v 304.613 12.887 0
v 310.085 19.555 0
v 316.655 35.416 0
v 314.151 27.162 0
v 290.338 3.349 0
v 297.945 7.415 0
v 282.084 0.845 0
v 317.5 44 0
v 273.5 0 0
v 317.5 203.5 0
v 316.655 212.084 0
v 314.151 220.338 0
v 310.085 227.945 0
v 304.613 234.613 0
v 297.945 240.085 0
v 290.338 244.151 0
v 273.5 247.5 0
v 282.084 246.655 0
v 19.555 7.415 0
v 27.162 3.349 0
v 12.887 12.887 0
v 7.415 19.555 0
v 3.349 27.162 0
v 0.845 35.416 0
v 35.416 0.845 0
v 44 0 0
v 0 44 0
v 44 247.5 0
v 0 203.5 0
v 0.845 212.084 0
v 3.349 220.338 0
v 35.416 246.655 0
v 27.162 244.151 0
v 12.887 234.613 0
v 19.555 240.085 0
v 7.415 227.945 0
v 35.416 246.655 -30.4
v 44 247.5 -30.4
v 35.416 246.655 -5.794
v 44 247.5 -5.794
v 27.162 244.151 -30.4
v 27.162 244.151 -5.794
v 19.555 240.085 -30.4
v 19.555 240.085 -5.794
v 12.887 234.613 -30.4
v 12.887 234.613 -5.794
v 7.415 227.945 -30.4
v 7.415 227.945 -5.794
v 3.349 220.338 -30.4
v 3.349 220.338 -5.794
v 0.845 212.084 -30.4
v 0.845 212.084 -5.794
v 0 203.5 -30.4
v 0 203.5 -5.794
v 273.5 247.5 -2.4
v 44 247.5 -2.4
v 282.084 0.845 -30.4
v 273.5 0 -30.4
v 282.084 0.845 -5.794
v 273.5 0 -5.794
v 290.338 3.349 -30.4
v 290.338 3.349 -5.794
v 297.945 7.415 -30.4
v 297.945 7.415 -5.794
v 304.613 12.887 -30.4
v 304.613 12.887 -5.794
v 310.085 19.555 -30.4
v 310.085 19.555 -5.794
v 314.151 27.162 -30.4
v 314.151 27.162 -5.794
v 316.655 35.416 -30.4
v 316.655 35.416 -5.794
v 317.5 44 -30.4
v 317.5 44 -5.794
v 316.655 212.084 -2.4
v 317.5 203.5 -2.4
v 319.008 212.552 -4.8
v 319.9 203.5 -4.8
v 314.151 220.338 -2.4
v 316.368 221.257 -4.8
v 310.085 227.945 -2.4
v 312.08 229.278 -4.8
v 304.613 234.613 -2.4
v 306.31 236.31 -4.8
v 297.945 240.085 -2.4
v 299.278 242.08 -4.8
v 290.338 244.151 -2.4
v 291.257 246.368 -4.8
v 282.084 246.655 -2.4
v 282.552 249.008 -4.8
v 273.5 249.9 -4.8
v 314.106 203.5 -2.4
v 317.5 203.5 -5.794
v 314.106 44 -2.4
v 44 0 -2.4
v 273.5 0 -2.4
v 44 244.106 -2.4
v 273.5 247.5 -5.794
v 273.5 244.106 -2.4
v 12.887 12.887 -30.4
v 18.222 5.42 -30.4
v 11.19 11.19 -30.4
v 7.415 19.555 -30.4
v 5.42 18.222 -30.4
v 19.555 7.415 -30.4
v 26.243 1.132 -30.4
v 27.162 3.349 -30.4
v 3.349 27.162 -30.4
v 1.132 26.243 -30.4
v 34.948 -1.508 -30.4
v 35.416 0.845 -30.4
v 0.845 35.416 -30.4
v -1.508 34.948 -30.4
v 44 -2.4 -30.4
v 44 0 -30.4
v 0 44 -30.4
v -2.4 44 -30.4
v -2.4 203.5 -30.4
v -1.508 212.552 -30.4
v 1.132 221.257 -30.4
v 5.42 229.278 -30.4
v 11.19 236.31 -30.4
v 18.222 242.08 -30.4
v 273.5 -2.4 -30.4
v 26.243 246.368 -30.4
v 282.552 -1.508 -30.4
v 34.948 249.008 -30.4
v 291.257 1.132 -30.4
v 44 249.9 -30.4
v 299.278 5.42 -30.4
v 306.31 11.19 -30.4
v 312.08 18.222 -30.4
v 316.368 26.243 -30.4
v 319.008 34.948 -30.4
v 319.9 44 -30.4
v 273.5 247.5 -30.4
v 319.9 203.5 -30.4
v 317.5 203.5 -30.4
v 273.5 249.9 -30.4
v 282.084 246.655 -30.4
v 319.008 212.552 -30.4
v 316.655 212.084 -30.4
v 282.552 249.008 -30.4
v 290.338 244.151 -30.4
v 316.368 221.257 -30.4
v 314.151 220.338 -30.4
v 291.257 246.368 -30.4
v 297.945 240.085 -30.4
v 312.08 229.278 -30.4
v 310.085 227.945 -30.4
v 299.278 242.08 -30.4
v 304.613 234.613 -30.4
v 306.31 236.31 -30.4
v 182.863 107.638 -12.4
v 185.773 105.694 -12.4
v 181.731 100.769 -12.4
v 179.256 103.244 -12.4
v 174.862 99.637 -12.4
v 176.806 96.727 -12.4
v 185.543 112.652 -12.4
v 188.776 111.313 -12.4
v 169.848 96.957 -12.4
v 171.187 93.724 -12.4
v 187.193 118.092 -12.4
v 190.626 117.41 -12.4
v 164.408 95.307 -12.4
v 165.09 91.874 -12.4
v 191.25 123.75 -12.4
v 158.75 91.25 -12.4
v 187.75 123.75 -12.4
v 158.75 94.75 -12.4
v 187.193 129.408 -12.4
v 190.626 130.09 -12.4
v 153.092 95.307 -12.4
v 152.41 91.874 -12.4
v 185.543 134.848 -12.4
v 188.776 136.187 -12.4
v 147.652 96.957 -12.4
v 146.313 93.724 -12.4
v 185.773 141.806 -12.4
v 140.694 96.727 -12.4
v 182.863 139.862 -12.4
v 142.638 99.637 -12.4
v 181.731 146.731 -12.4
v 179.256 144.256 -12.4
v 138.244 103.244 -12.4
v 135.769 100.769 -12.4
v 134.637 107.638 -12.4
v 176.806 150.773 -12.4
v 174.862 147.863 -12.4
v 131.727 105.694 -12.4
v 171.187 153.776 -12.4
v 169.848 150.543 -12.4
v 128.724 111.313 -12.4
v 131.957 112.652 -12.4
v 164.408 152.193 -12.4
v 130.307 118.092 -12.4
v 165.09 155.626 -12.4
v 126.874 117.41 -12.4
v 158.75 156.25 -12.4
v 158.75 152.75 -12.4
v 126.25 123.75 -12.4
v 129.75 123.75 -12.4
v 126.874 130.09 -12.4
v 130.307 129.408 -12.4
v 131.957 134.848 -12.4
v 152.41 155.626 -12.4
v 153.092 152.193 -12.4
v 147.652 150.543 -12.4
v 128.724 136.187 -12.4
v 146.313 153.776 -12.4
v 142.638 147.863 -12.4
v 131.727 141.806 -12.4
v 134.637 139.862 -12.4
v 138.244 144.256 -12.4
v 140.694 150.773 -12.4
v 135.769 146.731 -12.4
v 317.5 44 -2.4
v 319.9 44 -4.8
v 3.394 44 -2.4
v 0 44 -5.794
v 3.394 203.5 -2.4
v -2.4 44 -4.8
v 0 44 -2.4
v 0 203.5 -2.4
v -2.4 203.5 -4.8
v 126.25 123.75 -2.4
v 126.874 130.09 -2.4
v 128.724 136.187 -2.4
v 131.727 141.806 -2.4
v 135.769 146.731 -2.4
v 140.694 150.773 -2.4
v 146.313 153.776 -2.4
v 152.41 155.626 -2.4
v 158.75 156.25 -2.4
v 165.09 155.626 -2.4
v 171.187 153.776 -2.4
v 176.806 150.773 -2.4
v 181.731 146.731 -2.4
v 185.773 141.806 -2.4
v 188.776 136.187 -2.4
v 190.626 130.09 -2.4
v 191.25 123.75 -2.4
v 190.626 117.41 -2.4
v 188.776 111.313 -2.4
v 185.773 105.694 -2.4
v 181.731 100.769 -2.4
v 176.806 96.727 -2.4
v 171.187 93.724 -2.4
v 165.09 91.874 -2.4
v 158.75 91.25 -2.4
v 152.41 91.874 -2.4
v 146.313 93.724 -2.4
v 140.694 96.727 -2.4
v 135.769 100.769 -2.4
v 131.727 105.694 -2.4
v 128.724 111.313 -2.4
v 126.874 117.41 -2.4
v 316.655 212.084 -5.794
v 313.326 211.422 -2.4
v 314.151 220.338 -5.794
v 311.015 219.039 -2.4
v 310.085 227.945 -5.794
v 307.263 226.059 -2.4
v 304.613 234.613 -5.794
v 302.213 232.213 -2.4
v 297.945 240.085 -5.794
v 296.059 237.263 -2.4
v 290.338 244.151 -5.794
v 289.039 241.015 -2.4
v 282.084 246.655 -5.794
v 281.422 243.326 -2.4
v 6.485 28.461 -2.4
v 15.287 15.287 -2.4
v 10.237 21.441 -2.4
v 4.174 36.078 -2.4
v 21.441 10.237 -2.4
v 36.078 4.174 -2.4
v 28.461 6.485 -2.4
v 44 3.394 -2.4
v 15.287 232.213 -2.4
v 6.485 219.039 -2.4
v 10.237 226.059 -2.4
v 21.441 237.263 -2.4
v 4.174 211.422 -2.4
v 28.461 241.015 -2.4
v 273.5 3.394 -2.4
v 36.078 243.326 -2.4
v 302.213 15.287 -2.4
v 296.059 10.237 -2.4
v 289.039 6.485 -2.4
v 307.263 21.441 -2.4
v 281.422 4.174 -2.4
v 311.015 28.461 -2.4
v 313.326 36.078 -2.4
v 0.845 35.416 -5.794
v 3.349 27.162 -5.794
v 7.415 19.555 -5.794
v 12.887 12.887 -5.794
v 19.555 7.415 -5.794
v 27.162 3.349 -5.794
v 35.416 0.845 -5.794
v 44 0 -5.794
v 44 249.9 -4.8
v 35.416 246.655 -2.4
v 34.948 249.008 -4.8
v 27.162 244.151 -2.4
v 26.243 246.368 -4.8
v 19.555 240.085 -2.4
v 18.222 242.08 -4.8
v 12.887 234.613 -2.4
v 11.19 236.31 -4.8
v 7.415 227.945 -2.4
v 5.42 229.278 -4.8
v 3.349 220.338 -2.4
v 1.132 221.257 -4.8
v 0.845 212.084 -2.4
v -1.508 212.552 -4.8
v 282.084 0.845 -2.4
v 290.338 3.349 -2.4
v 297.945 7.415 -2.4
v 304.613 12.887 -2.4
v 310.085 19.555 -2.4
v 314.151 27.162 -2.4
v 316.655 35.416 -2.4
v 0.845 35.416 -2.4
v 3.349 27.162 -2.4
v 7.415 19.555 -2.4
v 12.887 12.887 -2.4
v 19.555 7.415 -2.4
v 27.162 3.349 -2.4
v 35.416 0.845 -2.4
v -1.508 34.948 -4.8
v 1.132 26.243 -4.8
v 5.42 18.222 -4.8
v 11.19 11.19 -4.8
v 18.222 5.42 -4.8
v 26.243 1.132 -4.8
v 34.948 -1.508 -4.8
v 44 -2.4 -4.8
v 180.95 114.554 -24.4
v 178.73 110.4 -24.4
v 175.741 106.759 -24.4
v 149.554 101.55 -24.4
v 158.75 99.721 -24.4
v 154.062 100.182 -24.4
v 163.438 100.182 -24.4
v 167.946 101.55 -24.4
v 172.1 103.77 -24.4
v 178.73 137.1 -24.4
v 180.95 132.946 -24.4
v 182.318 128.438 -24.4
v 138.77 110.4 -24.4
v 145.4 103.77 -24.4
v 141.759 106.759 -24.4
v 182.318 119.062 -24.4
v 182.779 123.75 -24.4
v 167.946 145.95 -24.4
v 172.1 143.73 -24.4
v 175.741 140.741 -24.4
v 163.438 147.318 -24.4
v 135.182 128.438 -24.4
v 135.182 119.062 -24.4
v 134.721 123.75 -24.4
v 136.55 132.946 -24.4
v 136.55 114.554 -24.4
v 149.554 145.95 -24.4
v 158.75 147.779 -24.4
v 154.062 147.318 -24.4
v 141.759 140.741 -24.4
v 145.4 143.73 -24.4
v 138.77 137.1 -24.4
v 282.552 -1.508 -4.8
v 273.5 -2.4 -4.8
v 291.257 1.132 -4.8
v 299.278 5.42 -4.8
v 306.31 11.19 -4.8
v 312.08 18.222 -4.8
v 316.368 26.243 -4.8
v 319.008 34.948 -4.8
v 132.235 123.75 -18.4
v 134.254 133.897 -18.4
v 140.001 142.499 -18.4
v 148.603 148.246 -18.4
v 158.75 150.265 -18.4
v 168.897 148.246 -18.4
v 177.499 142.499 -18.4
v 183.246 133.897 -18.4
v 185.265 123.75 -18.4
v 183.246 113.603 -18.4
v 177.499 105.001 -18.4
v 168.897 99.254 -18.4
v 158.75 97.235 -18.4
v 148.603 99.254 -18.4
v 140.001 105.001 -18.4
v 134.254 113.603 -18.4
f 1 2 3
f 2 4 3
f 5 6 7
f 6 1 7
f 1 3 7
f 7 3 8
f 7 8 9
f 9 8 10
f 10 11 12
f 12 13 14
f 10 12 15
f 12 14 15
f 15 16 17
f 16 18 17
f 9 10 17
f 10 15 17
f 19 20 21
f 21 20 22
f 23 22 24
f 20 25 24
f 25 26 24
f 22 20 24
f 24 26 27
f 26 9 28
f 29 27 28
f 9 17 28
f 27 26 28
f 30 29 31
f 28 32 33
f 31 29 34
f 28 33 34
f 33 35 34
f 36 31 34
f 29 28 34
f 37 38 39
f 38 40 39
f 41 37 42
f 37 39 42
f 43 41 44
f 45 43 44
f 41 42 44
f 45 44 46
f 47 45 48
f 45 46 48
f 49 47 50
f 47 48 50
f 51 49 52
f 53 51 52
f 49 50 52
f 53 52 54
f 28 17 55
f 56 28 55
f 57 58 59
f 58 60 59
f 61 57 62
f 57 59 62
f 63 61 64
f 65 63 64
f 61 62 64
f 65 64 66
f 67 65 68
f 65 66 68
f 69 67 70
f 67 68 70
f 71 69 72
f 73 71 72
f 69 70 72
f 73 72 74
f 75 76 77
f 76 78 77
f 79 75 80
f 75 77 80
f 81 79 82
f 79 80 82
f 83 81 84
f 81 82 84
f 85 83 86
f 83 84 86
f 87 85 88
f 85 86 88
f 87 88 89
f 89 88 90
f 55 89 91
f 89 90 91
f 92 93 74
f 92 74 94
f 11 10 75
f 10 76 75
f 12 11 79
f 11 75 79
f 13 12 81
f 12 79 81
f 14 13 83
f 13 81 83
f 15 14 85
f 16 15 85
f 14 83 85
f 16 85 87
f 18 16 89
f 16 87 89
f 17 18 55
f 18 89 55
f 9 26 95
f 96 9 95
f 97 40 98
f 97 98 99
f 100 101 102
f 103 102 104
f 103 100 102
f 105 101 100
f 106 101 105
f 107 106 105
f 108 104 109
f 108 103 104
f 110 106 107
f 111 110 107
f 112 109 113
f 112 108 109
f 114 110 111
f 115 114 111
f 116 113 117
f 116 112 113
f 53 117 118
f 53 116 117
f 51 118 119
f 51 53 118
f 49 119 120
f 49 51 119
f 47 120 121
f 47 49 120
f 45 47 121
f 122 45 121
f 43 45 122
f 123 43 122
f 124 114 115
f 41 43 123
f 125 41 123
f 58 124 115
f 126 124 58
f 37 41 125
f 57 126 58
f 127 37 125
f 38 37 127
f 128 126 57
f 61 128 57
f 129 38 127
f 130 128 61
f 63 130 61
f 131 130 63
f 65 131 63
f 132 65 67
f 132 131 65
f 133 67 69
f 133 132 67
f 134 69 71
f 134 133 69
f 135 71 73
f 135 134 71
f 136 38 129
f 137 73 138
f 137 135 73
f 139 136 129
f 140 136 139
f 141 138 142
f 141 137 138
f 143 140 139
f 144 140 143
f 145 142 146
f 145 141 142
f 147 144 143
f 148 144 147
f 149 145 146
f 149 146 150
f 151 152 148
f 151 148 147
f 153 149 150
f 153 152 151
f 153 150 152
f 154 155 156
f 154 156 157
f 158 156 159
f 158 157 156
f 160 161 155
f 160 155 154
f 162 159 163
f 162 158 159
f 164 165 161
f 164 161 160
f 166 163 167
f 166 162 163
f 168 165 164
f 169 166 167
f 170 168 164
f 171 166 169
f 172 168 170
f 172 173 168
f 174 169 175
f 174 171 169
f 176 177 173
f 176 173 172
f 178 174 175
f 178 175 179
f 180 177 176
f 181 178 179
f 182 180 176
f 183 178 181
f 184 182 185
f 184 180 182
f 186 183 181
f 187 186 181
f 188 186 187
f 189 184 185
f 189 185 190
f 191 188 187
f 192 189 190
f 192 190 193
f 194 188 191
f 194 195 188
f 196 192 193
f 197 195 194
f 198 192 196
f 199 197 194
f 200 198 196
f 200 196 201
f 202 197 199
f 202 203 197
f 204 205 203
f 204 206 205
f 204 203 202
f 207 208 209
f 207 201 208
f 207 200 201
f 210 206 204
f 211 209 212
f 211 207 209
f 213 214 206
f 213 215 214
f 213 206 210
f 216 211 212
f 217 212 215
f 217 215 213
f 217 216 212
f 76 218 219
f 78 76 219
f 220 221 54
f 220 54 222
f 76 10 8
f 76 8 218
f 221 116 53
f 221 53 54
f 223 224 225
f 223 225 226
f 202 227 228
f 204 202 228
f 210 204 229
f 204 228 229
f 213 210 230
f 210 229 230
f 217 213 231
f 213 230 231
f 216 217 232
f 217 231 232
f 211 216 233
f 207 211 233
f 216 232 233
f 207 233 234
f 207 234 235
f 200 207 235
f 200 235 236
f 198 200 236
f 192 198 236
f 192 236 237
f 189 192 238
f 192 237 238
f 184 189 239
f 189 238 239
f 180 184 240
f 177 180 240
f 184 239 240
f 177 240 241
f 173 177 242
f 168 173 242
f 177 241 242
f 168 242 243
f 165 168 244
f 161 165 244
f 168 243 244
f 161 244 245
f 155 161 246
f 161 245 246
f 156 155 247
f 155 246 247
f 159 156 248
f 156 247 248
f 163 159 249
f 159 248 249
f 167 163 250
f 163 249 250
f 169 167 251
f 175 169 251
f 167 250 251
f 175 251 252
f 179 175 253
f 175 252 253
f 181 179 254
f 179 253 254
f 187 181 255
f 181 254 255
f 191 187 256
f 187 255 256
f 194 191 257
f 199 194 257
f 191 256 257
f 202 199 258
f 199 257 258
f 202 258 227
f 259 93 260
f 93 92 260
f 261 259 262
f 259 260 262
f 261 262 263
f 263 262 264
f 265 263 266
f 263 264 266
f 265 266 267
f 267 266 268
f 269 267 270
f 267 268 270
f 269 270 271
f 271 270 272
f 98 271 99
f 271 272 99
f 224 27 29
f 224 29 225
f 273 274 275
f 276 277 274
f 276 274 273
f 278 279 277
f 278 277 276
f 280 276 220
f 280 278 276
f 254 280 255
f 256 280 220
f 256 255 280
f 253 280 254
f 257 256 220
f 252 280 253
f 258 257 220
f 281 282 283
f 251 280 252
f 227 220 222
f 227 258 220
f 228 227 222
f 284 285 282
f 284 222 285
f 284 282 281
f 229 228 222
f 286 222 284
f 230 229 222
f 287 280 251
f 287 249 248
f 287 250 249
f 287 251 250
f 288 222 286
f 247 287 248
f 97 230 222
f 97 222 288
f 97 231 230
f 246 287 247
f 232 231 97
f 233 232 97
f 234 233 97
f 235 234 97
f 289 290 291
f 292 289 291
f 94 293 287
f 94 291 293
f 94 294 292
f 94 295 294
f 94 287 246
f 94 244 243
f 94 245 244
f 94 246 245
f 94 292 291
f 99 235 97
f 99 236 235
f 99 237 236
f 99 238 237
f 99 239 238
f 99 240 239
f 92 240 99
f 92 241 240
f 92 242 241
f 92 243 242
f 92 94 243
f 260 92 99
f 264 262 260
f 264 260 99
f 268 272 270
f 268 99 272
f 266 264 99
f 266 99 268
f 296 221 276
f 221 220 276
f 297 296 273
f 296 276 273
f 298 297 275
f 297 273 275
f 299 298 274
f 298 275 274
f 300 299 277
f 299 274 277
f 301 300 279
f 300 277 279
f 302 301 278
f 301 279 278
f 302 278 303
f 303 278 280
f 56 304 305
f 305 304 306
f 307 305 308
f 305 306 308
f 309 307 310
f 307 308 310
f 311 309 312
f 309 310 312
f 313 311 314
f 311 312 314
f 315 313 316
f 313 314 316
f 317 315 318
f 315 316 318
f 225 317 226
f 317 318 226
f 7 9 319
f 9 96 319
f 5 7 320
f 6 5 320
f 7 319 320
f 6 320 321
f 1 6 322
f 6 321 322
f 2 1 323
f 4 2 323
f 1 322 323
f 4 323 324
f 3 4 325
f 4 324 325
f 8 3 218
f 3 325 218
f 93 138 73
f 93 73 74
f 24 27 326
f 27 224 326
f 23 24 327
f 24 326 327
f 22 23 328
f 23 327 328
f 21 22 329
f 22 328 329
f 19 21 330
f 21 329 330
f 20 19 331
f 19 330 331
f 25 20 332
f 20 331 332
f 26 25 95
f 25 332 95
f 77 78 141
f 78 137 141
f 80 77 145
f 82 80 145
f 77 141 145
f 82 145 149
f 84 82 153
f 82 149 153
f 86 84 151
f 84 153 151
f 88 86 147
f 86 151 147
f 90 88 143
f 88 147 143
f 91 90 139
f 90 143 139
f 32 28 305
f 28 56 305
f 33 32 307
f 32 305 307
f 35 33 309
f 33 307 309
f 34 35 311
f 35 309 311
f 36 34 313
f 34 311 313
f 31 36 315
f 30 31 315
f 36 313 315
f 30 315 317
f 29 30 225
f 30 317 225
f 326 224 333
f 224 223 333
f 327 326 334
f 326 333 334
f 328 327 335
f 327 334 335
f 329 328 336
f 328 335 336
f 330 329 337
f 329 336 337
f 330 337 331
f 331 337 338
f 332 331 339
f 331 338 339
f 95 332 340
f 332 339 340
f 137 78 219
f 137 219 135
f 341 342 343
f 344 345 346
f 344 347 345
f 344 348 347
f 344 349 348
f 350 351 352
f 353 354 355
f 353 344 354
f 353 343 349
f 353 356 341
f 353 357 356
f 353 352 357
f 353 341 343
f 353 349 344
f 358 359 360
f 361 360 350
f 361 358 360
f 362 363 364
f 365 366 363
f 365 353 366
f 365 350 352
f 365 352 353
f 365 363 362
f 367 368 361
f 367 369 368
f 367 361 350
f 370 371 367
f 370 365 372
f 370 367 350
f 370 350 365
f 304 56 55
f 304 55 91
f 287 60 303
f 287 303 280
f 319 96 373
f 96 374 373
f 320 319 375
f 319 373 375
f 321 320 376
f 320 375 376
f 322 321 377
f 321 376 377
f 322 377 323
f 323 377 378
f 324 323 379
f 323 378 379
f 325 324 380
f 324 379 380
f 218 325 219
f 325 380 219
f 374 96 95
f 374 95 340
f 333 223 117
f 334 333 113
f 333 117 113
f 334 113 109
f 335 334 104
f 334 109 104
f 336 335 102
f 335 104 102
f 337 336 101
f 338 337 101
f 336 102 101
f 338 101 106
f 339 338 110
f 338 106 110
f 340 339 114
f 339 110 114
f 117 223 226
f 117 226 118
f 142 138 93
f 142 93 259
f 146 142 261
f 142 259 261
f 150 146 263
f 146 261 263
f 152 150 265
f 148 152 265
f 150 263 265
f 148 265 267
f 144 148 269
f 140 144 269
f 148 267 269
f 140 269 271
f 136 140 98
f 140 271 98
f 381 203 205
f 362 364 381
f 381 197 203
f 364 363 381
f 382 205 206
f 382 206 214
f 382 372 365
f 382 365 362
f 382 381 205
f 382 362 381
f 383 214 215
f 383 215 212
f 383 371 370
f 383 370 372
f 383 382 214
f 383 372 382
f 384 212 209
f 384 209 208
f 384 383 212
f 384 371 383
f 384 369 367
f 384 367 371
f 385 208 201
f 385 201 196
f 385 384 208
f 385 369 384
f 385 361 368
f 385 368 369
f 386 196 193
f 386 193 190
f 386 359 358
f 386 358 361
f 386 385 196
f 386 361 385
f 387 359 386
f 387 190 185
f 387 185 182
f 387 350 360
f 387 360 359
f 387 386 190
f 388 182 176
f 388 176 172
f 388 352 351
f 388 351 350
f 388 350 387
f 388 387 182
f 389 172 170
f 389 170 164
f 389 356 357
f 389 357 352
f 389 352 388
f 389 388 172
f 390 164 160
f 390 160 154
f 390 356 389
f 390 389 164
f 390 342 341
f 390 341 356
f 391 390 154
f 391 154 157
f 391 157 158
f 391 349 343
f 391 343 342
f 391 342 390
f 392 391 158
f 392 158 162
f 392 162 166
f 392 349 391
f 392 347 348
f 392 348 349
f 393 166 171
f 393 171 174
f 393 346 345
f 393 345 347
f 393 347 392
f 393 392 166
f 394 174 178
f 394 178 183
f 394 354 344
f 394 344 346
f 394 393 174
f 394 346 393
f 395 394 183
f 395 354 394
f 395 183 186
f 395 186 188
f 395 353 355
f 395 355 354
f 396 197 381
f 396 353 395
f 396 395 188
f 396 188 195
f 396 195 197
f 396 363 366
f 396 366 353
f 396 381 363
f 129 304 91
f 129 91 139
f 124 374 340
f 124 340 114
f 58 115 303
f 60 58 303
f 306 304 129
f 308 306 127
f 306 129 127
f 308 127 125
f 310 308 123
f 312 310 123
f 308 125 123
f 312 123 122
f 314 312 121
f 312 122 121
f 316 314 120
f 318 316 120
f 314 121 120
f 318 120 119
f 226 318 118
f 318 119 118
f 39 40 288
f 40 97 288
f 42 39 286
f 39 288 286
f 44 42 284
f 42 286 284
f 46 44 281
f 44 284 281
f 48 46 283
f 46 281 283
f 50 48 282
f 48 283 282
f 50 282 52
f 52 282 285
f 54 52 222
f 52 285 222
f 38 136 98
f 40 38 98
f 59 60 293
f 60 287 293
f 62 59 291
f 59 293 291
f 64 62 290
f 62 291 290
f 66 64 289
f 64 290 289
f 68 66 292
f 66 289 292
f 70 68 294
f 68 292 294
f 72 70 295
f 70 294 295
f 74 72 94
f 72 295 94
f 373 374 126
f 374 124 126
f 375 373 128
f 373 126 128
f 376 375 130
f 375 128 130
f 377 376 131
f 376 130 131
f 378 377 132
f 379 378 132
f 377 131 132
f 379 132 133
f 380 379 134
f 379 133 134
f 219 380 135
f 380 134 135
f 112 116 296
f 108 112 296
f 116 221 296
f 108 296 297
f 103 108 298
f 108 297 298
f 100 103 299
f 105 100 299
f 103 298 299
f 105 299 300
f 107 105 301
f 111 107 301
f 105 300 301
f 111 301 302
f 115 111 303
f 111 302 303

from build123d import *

# Parameters (mm, degrees)
BOSS_EXTRUDE1_DEPTH = 2.4
SKETCH2_R           = 32.5
BOSS_EXTRUDE2_DEPTH = 10
SKETCH3_R           = 29
BOSS_EXTRUDE3_DEPTH = 12
BOSS_EXTRUDE3_TAPER = 22.5


with BuildPart() as part:
    # Sweep2: sweep along a path in BasketRing
    with BuildLine(Plane.XY) as sweep2_path:
        Line((44, 0), (273.5, 0))
        ThreePointArc((273.5, 0), (304.612698372, 12.887301628), (317.5, 44))
        Line((317.5, 44), (317.5, 203.5))
        ThreePointArc((317.5, 203.5), (304.612698372, 234.612698372), (273.5, 247.5))
        Line((273.5, 247.5), (44, 247.5))
        ThreePointArc((44, 247.5), (12.887301628, 234.612698372), (0, 203.5))
        Line((0, 203.5), (0, 44))
        ThreePointArc((0, 44), (12.887301628, 12.887301628), (44, 0))
    # ShapeOf Edge → Sweep2 (sweep)
    with BuildSketch(Plane(origin=(44, 0, 0), x_dir=(0, 0, -1), z_dir=(1, 0, 0))):
        Polygon((0, 0), (2.4, 0), (4.8, -2.4), (30.4, -2.4), (30.4, 0), (5.79411255, 0), (2.4, 3.39411255), (2.4, 7), (0, 7), align=None)
    sweep(path=sweep2_path.line)

    # Sketch1 → Boss-Extrude1 (add)
    with BuildSketch(Plane.XY):
        with BuildLine():
            Line((44, 240.5), (273.5, 240.5))
            ThreePointArc((273.5, 240.5), (299.662950904, 229.662950904), (310.5, 203.5))
            Line((310.5, 203.5), (310.5, 44))
            ThreePointArc((310.5, 44), (299.662950904, 17.837049096), (273.5, 7))
            Line((273.5, 7), (44, 7))
            ThreePointArc((44, 7), (17.837049096, 17.837049096), (7, 44))
            Line((7, 44), (7, 203.5))
            ThreePointArc((7, 203.5), (17.837049096, 229.662950904), (44, 240.5))
        make_face()
    extrude(amount=-BOSS_EXTRUDE1_DEPTH)

    # Sketch2 → Boss-Extrude2 (add)
    with BuildSketch(Plane(origin=(0, 0, -2.4), x_dir=(-1, 0, 0), z_dir=(0, 0, -1))):
        with Locations((-158.75, 123.75)):
            Circle(SKETCH2_R)
    extrude(amount=BOSS_EXTRUDE2_DEPTH)

    # Sketch3 → Boss-Extrude3 (add)
    with BuildSketch(Plane(origin=(0, 0, -12.4), x_dir=(-1, 0, 0), z_dir=(0, 0, -1))):
        with Locations((-158.75, 123.75)):
            Circle(SKETCH3_R)
    extrude(amount=BOSS_EXTRUDE3_DEPTH, taper=BOSS_EXTRUDE3_TAPER)


solid = part.part
